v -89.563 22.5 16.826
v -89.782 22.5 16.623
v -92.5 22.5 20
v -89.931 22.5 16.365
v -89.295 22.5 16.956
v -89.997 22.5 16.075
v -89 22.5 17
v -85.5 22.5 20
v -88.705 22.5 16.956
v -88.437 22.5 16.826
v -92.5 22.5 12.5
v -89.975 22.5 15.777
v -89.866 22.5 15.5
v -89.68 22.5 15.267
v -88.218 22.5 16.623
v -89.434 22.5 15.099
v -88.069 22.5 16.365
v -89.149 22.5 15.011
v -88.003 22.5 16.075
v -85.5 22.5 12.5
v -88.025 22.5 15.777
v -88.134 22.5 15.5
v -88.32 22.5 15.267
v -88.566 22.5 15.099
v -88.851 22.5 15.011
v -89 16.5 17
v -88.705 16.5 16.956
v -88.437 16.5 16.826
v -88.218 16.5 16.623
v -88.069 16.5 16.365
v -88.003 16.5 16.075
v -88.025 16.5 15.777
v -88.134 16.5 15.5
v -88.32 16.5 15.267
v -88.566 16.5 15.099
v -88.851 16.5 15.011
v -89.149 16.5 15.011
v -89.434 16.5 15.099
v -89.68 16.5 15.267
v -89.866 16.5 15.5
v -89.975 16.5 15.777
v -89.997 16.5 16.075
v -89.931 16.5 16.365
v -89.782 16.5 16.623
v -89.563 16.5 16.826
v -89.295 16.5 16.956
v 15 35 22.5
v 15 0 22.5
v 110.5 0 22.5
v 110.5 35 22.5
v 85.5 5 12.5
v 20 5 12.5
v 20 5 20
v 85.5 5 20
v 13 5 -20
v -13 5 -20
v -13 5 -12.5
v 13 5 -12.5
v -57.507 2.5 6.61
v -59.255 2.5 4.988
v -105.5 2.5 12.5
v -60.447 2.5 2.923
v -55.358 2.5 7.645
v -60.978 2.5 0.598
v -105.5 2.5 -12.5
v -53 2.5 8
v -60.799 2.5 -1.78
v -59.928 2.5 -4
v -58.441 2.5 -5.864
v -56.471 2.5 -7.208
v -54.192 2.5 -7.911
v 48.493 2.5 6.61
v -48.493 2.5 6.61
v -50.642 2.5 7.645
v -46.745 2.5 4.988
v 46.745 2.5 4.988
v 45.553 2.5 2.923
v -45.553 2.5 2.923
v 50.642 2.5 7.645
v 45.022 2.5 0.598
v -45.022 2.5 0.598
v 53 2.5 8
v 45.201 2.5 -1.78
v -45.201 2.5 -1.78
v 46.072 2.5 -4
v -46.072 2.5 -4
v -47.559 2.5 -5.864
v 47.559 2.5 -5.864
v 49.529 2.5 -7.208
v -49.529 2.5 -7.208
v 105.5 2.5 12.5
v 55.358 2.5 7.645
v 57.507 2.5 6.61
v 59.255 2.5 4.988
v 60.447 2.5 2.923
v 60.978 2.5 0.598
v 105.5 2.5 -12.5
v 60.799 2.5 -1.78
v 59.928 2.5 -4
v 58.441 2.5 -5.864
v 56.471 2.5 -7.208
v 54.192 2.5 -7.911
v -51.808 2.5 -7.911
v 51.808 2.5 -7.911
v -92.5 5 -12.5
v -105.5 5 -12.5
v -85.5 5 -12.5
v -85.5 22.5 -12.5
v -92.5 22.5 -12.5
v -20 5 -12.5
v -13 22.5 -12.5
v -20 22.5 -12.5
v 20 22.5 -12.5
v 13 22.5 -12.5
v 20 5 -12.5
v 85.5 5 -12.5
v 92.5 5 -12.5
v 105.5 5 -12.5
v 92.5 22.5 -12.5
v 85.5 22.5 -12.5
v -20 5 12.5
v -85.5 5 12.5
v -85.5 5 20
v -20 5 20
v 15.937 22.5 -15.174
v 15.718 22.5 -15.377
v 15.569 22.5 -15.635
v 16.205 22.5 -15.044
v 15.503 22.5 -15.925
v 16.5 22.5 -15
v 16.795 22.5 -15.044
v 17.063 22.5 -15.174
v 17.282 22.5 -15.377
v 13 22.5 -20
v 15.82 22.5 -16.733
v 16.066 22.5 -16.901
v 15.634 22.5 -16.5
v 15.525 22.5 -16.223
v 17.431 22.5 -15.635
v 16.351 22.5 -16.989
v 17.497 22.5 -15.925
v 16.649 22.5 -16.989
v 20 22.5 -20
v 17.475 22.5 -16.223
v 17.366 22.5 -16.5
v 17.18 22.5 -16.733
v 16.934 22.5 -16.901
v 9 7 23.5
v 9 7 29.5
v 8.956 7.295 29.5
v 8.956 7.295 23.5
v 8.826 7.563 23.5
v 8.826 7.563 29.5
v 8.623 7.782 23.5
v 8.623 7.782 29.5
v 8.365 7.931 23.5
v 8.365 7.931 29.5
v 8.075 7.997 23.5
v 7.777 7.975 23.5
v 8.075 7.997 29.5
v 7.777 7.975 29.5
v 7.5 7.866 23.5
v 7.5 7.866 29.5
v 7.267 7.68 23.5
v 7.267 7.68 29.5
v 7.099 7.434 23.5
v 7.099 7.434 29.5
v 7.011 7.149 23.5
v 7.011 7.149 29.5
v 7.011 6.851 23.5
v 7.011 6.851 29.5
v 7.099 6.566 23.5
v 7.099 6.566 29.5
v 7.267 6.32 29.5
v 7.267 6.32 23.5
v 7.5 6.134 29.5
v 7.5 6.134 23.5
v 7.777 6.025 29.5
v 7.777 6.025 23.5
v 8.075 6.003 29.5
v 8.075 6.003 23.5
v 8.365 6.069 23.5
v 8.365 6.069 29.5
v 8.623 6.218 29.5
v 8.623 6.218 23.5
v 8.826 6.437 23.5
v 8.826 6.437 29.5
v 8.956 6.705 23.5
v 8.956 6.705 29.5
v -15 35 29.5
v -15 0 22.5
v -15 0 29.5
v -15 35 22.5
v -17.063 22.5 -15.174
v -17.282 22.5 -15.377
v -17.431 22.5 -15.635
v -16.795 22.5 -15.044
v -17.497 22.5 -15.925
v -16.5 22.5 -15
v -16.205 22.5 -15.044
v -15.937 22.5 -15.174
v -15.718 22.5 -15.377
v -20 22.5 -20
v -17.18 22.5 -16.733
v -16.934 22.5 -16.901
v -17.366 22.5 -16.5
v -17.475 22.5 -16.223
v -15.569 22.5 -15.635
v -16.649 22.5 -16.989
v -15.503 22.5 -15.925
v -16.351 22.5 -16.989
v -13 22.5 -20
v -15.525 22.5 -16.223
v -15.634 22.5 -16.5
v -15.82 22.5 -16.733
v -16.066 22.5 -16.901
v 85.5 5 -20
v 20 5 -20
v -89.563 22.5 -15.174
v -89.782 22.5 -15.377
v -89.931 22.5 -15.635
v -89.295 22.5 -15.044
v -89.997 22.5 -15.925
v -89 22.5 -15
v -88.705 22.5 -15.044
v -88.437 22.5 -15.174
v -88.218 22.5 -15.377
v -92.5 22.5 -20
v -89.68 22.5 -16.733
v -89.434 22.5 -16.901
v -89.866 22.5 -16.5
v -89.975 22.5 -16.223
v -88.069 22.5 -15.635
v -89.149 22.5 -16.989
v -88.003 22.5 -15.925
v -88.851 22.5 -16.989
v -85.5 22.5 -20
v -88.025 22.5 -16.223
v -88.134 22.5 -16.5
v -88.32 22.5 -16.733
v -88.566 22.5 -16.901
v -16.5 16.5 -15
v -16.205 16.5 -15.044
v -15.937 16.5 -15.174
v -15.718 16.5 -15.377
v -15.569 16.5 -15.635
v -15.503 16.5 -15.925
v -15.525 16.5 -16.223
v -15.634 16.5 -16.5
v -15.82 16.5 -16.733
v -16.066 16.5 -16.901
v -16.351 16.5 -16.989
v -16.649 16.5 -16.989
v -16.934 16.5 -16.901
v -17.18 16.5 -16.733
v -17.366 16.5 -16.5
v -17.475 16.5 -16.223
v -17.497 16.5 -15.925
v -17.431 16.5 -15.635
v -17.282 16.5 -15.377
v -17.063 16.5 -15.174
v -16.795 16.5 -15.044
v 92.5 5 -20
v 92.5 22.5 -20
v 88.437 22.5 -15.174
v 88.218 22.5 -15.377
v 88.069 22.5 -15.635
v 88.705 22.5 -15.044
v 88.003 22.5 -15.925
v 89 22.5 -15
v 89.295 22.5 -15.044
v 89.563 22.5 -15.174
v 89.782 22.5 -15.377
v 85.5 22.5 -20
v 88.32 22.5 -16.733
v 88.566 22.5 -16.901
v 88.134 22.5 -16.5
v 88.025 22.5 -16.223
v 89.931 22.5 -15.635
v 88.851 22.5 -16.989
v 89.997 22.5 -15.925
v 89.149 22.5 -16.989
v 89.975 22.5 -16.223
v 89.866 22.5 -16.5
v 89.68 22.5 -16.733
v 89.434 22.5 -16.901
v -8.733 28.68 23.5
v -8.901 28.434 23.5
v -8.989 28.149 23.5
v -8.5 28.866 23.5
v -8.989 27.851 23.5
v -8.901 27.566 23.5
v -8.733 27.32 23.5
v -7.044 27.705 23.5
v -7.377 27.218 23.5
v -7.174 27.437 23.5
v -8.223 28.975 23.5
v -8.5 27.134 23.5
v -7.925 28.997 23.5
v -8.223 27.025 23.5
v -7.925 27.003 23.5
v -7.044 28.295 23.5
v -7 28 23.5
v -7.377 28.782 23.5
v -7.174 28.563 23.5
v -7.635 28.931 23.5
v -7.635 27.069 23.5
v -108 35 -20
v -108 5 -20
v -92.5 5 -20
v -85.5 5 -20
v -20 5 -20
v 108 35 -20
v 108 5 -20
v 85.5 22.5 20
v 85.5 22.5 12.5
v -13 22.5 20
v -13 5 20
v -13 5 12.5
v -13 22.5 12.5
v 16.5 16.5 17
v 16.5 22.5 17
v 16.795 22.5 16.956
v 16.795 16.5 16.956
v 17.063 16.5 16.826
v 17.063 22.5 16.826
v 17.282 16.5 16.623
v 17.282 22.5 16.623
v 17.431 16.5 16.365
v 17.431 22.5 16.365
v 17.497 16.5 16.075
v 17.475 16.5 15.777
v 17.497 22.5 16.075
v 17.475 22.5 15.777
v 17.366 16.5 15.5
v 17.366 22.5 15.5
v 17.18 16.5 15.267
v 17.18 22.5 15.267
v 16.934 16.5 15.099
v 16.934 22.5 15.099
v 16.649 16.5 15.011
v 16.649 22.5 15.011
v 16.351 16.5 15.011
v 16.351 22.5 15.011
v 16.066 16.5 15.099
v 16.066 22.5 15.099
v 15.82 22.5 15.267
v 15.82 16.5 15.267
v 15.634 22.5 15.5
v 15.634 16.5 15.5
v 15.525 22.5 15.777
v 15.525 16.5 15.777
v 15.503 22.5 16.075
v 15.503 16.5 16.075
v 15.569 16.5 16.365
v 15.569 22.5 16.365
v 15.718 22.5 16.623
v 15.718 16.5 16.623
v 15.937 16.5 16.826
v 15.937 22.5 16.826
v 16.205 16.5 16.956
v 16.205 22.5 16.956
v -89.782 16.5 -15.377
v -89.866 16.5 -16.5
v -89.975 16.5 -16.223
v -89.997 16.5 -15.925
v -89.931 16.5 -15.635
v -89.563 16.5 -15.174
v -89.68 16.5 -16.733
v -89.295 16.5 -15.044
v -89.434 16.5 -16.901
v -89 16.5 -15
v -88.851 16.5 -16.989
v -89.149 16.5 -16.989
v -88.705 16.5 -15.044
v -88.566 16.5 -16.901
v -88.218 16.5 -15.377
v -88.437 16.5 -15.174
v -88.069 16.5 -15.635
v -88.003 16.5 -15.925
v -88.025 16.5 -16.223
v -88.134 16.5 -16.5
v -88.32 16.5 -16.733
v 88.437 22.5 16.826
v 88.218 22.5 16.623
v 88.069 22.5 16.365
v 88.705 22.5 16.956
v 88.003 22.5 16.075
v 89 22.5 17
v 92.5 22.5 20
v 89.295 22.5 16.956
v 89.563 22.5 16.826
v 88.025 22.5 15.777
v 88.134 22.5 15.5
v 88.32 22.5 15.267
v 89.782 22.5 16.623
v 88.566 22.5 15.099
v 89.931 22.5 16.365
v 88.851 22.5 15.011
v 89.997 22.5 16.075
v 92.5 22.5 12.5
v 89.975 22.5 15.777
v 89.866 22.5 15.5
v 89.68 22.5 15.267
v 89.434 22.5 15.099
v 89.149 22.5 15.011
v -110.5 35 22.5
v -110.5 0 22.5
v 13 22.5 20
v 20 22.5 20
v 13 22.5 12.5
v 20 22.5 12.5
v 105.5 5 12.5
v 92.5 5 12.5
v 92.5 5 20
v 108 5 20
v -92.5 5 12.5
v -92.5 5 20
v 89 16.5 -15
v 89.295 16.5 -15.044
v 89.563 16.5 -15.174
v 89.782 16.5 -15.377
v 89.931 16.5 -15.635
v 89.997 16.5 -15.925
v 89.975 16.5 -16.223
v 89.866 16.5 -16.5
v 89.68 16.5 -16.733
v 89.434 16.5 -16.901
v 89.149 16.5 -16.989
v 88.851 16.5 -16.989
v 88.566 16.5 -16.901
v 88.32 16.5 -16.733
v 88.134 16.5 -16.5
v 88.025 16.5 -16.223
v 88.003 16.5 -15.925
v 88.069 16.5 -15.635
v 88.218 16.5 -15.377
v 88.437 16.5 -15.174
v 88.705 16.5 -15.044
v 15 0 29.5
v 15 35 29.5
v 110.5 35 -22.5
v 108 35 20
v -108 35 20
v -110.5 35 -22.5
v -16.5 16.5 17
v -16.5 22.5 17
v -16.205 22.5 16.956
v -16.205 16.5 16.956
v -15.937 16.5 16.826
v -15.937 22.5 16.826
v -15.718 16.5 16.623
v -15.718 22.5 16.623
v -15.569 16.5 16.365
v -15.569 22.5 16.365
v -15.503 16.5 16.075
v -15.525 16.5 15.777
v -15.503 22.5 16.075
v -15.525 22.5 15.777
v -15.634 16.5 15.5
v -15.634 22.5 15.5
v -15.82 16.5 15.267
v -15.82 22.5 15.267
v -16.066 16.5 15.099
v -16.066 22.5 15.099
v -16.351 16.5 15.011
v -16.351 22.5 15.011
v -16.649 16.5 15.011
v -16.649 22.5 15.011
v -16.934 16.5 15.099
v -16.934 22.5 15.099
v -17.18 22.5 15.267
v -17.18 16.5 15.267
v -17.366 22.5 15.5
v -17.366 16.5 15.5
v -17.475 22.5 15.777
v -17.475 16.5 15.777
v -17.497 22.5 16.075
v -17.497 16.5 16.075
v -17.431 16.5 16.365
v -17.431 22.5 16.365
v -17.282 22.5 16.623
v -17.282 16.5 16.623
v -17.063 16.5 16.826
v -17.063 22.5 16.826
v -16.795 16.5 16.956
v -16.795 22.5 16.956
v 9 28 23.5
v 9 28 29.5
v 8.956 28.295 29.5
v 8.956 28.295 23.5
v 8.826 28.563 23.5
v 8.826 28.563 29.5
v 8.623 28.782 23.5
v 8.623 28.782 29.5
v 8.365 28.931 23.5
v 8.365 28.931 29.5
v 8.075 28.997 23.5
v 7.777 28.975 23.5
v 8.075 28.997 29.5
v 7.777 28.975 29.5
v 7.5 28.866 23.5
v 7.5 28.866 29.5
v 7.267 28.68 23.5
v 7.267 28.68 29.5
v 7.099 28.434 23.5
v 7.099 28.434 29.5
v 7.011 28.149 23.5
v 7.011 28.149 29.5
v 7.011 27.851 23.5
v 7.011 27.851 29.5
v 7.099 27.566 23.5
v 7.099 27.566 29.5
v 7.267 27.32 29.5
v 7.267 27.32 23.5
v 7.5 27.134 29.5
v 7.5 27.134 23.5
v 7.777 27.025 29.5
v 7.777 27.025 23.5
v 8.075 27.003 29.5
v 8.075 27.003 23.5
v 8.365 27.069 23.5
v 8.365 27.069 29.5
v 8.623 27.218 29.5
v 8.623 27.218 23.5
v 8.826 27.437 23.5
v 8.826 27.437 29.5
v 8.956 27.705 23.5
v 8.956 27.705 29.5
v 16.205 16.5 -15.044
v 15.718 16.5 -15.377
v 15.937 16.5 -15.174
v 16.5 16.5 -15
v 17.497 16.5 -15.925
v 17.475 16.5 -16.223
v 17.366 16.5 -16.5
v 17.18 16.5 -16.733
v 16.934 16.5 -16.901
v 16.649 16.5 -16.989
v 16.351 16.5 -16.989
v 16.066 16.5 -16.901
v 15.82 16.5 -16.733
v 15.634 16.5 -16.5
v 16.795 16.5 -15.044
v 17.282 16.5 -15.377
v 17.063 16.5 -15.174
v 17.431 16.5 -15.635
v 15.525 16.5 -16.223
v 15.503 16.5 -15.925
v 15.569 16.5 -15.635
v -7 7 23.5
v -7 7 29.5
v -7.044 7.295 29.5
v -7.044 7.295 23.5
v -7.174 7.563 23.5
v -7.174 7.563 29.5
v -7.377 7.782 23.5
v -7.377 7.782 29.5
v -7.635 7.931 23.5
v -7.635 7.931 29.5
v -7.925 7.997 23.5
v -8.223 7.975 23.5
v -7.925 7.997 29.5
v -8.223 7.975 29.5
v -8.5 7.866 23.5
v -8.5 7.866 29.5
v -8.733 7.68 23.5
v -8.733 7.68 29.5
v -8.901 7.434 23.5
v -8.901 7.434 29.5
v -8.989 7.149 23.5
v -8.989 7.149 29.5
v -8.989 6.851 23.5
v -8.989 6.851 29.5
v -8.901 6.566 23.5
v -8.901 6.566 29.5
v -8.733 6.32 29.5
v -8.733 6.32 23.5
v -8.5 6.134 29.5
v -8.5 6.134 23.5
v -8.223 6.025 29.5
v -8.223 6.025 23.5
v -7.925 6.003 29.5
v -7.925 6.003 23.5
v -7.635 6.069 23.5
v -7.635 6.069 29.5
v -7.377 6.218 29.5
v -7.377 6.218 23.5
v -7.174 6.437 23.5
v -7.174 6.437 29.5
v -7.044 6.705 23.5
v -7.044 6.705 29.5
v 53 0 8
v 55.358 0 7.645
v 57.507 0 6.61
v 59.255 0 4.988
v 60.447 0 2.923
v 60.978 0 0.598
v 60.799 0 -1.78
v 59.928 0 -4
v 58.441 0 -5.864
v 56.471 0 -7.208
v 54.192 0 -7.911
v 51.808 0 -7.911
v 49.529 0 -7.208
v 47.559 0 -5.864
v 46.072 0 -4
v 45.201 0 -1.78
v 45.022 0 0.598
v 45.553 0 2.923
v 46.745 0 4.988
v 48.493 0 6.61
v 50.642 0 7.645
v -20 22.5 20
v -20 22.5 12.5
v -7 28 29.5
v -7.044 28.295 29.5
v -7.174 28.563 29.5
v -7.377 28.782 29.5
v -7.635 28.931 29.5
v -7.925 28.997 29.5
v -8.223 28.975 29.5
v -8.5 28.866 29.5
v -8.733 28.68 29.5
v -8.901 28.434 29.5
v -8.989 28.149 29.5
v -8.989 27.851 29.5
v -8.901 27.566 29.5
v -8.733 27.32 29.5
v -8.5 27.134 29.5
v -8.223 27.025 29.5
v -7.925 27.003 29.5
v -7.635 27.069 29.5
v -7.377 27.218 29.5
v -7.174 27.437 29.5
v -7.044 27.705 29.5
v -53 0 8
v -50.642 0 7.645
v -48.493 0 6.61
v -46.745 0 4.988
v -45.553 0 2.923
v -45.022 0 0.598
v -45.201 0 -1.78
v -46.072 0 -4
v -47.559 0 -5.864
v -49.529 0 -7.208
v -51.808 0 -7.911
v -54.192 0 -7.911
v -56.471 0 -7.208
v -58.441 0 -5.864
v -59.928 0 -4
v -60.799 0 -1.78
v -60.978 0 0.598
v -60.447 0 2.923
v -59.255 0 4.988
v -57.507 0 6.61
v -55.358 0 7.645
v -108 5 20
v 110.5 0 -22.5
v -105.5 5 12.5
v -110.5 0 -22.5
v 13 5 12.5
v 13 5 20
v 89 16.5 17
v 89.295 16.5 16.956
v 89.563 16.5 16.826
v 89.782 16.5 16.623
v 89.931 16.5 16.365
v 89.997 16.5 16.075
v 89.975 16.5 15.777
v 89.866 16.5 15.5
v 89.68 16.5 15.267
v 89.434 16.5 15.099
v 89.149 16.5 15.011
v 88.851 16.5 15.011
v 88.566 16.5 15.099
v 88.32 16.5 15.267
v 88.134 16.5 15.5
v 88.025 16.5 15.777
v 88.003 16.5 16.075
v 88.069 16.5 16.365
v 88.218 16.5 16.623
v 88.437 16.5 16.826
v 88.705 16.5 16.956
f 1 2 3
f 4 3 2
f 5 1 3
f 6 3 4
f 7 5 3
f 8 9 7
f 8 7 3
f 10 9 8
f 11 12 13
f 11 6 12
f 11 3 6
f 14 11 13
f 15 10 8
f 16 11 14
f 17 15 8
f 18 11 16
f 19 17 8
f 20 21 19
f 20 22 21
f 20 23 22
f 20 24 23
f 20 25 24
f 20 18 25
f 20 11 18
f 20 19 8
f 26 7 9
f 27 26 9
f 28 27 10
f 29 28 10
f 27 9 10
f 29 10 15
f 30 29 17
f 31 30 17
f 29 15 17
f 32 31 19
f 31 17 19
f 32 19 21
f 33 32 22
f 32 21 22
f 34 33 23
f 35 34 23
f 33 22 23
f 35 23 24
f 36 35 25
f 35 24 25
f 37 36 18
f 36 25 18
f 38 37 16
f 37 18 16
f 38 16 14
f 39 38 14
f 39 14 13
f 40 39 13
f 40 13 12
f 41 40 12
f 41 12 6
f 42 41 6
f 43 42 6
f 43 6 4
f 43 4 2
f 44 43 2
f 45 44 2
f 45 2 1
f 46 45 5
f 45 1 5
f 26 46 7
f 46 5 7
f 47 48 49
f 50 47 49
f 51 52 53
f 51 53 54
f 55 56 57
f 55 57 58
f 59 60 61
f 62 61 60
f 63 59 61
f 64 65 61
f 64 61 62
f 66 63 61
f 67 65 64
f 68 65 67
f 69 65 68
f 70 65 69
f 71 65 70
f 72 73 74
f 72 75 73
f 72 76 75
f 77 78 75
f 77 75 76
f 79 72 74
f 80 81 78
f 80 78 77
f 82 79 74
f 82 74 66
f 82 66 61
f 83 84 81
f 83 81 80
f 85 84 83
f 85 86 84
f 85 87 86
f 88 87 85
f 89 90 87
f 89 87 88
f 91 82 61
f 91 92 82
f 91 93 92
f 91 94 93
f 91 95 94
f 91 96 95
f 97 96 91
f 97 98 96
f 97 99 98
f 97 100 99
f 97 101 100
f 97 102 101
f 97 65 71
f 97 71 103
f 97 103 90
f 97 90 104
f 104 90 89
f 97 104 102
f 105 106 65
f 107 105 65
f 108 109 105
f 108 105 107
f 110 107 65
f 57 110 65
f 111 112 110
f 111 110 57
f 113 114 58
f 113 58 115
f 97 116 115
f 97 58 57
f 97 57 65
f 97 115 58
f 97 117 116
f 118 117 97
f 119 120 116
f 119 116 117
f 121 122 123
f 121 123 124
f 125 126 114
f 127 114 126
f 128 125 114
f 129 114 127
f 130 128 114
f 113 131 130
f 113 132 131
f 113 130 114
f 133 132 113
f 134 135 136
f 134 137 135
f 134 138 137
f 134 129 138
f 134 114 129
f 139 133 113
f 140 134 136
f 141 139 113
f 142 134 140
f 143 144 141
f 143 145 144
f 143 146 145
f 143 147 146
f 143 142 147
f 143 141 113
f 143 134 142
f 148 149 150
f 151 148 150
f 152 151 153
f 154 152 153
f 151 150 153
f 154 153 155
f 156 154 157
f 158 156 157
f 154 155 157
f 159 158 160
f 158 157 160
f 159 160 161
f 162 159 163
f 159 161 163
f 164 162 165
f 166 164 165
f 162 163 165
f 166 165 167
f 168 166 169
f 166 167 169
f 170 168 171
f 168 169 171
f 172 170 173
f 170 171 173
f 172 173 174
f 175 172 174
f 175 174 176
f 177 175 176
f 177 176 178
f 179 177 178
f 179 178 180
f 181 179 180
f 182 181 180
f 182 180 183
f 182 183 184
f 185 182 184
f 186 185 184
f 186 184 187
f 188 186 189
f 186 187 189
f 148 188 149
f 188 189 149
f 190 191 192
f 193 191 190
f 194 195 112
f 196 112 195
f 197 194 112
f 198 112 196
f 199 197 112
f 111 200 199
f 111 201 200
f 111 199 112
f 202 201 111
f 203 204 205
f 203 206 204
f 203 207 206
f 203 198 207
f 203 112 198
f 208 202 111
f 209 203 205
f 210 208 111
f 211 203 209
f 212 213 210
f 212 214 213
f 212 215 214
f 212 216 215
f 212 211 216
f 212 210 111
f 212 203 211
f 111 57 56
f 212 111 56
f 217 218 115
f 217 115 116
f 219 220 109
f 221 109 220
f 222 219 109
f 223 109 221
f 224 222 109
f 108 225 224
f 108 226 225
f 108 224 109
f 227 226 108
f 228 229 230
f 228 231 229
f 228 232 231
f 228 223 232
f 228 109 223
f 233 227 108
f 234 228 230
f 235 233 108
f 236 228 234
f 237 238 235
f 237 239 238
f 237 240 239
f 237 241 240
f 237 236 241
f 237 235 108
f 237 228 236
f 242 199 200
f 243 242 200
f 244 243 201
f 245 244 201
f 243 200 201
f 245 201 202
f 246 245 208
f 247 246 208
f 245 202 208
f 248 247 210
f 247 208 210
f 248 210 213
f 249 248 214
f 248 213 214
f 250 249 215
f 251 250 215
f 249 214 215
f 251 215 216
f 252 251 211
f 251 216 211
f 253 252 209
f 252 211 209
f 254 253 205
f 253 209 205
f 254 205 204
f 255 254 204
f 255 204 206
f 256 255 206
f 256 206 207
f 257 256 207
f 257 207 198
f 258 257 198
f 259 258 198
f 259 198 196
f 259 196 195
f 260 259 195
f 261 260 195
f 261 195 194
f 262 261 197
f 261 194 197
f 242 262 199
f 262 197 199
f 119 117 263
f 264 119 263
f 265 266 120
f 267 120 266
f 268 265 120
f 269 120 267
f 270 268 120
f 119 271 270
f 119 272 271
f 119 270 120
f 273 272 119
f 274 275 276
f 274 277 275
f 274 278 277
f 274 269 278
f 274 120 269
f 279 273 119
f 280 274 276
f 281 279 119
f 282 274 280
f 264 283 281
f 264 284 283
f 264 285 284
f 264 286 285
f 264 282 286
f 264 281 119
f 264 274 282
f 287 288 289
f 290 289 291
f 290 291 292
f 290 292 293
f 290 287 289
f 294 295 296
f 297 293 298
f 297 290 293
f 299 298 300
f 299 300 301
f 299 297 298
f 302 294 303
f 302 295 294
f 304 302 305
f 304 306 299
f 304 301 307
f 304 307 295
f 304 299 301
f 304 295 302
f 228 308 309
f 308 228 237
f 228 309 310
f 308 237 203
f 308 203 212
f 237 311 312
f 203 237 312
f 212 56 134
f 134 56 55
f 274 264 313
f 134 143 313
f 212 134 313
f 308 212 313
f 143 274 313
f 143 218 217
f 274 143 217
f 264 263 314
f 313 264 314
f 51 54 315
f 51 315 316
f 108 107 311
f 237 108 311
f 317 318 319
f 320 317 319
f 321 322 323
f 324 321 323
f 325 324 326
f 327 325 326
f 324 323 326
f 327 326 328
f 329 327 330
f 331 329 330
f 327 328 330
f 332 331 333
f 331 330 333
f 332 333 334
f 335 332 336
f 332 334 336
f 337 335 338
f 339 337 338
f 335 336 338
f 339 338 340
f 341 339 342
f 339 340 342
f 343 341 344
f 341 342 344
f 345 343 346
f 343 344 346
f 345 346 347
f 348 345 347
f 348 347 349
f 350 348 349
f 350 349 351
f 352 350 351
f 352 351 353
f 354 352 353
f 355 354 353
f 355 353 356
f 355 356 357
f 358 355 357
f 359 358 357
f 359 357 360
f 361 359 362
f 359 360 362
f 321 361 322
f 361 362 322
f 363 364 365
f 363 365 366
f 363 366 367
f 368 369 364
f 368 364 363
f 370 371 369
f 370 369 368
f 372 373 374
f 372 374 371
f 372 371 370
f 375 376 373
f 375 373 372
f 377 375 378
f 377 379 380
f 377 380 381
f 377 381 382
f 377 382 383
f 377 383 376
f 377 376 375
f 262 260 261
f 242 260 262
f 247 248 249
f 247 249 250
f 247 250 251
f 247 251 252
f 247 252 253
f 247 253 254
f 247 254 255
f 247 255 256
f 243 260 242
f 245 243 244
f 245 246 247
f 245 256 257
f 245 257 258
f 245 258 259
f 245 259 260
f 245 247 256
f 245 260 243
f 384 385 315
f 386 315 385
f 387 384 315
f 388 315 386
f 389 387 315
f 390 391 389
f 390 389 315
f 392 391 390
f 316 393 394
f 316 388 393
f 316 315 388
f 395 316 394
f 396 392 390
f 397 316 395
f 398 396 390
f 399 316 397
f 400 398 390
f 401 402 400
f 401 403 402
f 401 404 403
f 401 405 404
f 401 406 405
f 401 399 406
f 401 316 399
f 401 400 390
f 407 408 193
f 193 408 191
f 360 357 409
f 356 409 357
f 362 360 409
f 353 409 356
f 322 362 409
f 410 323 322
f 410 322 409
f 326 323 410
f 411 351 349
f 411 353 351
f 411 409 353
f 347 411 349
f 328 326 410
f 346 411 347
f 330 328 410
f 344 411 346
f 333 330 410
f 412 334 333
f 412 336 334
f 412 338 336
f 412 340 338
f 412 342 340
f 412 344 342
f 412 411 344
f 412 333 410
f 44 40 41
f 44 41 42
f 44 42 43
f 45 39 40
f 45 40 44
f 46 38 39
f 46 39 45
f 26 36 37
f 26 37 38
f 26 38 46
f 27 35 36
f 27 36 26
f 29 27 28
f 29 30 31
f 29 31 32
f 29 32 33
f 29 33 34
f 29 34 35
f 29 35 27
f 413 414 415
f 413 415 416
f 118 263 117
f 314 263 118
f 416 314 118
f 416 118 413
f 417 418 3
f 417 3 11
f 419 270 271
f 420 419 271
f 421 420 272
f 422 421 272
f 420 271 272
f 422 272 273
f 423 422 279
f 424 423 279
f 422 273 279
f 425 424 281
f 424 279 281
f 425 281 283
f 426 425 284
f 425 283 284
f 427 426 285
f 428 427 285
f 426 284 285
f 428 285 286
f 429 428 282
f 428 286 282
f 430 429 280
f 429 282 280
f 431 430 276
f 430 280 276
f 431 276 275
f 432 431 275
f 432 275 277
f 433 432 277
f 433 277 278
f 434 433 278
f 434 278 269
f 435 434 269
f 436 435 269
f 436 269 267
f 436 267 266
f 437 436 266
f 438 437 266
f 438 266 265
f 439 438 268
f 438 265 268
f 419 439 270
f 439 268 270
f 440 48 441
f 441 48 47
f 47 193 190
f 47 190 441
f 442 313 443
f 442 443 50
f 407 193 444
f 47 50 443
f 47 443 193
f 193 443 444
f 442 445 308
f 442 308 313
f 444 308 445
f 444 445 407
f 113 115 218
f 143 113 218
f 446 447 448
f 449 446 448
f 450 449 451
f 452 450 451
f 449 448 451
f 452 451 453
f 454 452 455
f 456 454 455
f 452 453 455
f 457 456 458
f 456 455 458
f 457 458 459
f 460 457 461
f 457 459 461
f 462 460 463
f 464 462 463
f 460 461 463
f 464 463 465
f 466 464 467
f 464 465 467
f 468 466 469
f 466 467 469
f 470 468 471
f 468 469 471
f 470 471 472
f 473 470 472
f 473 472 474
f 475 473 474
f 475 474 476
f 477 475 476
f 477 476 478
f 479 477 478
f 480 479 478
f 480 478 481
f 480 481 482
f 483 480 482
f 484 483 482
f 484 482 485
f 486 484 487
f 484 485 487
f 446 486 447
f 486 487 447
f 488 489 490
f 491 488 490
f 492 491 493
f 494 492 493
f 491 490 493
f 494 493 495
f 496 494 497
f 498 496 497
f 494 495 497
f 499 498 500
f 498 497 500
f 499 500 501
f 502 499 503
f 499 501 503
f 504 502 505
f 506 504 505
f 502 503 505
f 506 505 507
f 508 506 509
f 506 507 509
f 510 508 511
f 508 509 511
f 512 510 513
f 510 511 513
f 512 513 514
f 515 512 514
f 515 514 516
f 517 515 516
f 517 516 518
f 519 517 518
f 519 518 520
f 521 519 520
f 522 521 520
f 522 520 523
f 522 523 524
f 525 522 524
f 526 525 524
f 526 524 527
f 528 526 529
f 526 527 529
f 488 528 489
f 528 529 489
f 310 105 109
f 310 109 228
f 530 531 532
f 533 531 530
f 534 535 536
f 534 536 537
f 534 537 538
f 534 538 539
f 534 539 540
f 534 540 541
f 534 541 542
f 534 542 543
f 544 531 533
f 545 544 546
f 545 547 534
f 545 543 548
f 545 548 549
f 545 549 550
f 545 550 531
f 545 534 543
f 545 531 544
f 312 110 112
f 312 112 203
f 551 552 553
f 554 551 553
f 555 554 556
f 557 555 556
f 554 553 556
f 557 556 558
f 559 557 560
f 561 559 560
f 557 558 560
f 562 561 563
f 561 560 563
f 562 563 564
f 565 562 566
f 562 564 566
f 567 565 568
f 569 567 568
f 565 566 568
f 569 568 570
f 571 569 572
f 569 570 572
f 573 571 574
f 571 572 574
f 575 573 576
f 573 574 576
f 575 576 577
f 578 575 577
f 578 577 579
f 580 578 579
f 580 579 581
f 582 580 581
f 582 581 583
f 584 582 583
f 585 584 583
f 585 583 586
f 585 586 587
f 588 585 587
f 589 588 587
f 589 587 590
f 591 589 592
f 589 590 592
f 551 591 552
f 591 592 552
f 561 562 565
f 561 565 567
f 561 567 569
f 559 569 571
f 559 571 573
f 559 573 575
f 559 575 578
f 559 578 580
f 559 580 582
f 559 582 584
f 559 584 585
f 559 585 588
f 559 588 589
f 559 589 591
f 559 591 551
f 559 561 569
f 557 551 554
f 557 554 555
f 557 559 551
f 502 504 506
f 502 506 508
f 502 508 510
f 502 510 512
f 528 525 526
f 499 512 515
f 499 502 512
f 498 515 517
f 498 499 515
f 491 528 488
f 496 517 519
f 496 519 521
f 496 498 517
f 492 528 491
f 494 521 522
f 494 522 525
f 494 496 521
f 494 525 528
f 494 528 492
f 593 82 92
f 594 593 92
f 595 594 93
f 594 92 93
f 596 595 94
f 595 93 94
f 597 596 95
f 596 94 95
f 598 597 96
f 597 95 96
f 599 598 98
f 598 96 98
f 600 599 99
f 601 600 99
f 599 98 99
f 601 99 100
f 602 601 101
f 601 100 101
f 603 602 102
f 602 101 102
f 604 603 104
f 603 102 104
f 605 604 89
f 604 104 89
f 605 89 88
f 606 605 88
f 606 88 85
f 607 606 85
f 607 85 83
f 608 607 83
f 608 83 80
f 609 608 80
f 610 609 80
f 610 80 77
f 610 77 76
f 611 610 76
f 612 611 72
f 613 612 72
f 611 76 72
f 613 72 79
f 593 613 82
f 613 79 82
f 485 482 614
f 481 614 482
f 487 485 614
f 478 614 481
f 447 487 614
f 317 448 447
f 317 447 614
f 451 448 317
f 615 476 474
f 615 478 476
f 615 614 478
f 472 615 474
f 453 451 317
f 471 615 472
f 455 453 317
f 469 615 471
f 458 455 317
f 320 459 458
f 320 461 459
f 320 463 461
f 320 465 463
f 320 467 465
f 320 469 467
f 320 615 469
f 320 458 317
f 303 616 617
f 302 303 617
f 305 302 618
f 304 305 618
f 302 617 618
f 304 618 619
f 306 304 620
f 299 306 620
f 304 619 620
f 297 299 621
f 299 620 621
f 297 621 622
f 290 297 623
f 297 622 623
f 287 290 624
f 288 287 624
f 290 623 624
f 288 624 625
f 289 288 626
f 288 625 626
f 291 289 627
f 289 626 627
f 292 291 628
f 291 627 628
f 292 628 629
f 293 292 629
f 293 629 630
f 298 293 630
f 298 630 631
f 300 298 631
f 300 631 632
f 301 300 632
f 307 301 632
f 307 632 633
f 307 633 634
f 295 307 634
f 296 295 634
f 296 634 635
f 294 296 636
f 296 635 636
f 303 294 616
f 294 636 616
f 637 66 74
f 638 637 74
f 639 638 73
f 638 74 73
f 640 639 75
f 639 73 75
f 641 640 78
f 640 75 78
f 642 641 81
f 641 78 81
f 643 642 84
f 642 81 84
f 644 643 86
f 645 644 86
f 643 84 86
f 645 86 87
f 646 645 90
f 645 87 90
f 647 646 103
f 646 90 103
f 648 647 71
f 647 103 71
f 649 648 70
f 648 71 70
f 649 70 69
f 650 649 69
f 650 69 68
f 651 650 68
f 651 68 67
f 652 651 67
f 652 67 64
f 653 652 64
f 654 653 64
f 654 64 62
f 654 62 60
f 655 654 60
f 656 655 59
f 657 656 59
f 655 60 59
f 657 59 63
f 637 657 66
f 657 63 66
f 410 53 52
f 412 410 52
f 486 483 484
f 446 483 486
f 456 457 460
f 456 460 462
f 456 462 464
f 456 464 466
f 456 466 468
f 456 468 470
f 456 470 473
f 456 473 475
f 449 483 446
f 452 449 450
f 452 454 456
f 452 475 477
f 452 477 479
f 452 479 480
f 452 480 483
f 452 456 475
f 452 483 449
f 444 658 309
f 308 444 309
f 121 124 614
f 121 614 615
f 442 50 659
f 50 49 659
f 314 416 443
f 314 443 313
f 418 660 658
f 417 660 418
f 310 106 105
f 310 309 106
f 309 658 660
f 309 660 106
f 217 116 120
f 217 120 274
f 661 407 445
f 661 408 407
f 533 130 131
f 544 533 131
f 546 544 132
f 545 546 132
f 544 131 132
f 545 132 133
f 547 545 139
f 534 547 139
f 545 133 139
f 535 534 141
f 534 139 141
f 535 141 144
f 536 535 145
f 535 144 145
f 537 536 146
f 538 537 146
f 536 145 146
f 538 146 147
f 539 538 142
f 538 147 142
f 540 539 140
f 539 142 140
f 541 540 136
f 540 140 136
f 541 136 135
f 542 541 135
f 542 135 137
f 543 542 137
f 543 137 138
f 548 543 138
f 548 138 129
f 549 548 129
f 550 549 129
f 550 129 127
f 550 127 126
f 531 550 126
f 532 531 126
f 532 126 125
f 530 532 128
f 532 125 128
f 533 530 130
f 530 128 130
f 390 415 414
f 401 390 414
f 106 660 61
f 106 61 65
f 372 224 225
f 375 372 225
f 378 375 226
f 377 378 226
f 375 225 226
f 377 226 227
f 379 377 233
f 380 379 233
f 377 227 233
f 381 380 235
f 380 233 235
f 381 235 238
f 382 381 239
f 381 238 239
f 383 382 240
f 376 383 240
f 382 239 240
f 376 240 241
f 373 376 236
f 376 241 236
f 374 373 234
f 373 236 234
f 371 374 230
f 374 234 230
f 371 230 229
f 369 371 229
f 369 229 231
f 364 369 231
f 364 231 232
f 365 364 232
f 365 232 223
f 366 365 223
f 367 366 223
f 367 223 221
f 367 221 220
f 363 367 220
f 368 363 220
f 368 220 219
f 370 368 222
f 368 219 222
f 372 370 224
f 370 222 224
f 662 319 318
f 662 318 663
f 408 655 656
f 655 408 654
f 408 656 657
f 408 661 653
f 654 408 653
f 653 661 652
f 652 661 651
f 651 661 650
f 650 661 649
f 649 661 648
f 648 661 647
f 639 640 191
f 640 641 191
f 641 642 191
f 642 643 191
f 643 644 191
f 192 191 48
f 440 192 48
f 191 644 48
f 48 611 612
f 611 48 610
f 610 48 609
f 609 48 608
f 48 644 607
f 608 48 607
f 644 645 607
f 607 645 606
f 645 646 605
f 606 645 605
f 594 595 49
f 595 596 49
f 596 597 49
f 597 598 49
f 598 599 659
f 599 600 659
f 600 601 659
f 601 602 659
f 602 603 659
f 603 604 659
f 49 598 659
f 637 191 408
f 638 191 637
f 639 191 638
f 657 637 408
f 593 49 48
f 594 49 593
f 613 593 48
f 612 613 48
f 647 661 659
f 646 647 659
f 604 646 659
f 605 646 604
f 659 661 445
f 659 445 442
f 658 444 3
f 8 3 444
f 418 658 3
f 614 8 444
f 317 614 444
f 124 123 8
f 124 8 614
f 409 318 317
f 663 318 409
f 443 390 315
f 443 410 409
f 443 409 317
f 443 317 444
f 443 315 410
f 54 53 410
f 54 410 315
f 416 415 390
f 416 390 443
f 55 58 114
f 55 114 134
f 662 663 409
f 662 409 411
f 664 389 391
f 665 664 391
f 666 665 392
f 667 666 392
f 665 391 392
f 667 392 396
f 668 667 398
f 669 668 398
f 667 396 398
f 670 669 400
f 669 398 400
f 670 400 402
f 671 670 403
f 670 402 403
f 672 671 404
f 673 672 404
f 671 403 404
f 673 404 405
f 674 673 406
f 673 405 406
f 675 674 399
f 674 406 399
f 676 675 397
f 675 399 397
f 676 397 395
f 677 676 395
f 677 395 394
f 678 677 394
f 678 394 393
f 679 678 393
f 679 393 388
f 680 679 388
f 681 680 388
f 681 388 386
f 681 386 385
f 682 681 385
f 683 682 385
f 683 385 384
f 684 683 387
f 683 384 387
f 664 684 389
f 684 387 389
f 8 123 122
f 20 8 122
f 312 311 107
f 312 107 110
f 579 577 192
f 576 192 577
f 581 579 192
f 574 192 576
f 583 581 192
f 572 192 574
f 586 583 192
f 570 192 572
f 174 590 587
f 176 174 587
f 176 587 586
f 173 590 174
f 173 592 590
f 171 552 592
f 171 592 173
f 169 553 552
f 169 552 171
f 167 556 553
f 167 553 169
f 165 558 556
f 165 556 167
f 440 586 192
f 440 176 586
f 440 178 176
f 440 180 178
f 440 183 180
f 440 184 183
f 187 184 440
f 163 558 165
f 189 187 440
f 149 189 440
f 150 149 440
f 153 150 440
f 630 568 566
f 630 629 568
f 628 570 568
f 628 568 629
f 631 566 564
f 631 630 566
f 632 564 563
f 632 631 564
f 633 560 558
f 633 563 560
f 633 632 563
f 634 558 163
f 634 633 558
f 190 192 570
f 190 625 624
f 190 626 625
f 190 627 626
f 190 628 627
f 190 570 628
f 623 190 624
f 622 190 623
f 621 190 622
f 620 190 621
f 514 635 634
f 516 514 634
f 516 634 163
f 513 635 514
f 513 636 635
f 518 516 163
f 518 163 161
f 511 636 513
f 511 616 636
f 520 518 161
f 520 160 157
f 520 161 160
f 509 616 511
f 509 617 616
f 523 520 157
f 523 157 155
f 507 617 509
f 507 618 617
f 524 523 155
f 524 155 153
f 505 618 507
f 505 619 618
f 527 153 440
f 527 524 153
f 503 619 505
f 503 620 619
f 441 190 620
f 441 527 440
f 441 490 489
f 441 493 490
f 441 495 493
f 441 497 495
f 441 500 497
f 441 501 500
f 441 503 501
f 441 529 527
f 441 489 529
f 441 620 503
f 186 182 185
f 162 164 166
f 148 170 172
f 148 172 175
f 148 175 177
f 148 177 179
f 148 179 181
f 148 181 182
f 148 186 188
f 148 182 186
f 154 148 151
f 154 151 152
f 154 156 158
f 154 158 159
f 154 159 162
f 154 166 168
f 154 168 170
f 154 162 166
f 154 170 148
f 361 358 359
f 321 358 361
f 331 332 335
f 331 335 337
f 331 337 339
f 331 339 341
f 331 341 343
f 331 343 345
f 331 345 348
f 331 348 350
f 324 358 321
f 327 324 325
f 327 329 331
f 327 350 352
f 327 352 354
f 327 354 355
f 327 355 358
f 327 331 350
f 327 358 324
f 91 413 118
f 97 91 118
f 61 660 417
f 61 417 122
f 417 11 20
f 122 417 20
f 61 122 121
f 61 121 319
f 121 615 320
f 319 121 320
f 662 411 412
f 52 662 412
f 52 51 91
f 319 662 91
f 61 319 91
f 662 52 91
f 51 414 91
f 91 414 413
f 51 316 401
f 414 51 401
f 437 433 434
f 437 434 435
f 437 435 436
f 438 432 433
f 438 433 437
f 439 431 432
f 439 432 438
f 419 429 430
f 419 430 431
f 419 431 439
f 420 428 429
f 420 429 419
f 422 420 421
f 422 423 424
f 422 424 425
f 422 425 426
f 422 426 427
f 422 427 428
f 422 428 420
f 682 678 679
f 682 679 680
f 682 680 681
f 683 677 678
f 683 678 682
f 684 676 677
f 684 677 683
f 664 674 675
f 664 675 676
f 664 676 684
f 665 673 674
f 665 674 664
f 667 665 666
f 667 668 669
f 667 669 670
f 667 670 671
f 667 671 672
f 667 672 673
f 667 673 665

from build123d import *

# Parameters (mm, degrees)
SKETCH1_W           = 221
SKETCH1_H           = 45
BOSS_EXTRUDE1_DEPTH = 5
SKETCH2_W           = 211
SKETCH2_H           = 25
CUT_EXTRUDE1_DEPTH  = 2.5
SKETCH3_R           = 8
CUT_EXTRUDE2_DEPTH  = 2.5
SKETCH6_W           = 221
SKETCH6_H           = 45
SKETCH6_W_2         = 216
SKETCH6_H_2         = 40
BOSS_EXTRUDE3_DEPTH = 30
SKETCH7_W           = 7
SKETCH7_H           = 7.5
BOSS_EXTRUDE4_DEPTH = 17.5
SKETCH9_R           = 1
CUT_EXTRUDE3_DEPTH  = 6
SKETCH10_W          = 30
SKETCH10_H          = 35
BOSS_EXTRUDE5_DEPTH = 7
SKETCH11_R          = 1
CUT_EXTRUDE4_DEPTH  = 6


with BuildPart() as part:
    # Sketch1 → Boss-Extrude1 (new body)
    with BuildSketch(Plane(origin=(0, 0, 0), x_dir=(1, 0, 0), z_dir=(0, 1, 0))):
        Rectangle(SKETCH1_W, SKETCH1_H)
    extrude(amount=BOSS_EXTRUDE1_DEPTH)

    # Sketch2 → Cut-Extrude1 (cut)
    with BuildSketch(Plane(origin=(0, 5, 0), x_dir=(1, 0, 0), z_dir=(0, 1, 0))):
        Rectangle(SKETCH2_W, SKETCH2_H)
    extrude(amount=-CUT_EXTRUDE1_DEPTH, mode=Mode.SUBTRACT)

    # Sketch3 → Cut-Extrude2 (cut)
    with BuildSketch(Plane(origin=(0, 2.5, 0), x_dir=(1, 0, 0), z_dir=(0, 1, 0))):
        with Locations(Location((-53, 0, 0), (0, 0, 270))):
            Circle(SKETCH3_R)
        with Locations(Location((53, 0, 0), (0, 0, 270))):
            Circle(SKETCH3_R)
    extrude(amount=-CUT_EXTRUDE2_DEPTH, mode=Mode.SUBTRACT)

    # Sketch6 → Boss-Extrude3 (add)
    with BuildSketch(Plane(origin=(0, 5, 0), x_dir=(1, 0, 0), z_dir=(0, 1, 0))):
        Rectangle(SKETCH6_W, SKETCH6_H)
        Rectangle(SKETCH6_W_2, SKETCH6_H_2, mode=Mode.SUBTRACT)
    extrude(amount=BOSS_EXTRUDE3_DEPTH)

    # Sketch7 → Boss-Extrude4 (add)
    with BuildSketch(Plane(origin=(0, 5, 0), x_dir=(1, 0, 0), z_dir=(0, 1, 0))):
        with Locations((-89, 16.25)):
            Rectangle(SKETCH7_W, SKETCH7_H)
        with Locations((-89, -16.25)):
            Rectangle(SKETCH7_W, SKETCH7_H)
        with Locations((-16.5, 16.25)):
            Rectangle(SKETCH7_W, SKETCH7_H)
        with Locations((-16.5, -16.25)):
            Rectangle(SKETCH7_W, SKETCH7_H)
        with Locations((16.5, 16.25)):
            Rectangle(SKETCH7_W, SKETCH7_H)
        with Locations((16.5, -16.25)):
            Rectangle(SKETCH7_W, SKETCH7_H)
        with Locations((89, 16.25)):
            Rectangle(SKETCH7_W, SKETCH7_H)
        with Locations((89, -16.25)):
            Rectangle(SKETCH7_W, SKETCH7_H)
    extrude(amount=BOSS_EXTRUDE4_DEPTH)

    # Sketch9 → Cut-Extrude3 (cut)
    with BuildSketch(Plane(origin=(0, 22.5, 0), x_dir=(1, 0, 0), z_dir=(0, 1, 0))):
        with Locations(Location((-89, 16, 0), (0, 0, 270))):
            Circle(SKETCH9_R)
        with Locations(Location((-89, -16, 0), (0, 0, 270))):
            Circle(SKETCH9_R)
        with Locations(Location((-16.5, 16, 0), (0, 0, 270))):
            Circle(SKETCH9_R)
        with Locations(Location((-16.5, -16, 0), (0, 0, 270))):
            Circle(SKETCH9_R)
        with Locations(Location((16.5, 16, 0), (0, 0, 270))):
            Circle(SKETCH9_R)
        with Locations(Location((16.5, -16, 0), (0, 0, 270))):
            Circle(SKETCH9_R)
        with Locations(Location((89, 16, 0), (0, 0, 270))):
            Circle(SKETCH9_R)
        with Locations(Location((89, -16, 0), (0, 0, 270))):
            Circle(SKETCH9_R)
    extrude(amount=-CUT_EXTRUDE3_DEPTH, mode=Mode.SUBTRACT)

    # Sketch10 → Boss-Extrude5 (add)
    with BuildSketch(Plane.XY.offset(22.5)):
        with Locations((0, 17.5)):
            Rectangle(SKETCH10_W, SKETCH10_H)
    extrude(amount=BOSS_EXTRUDE5_DEPTH)

    # Sketch11 → Cut-Extrude4 (cut)
    with BuildSketch(Plane.XY.offset(29.5)):
        with Locations((-8, 28)):
            Circle(SKETCH11_R)
        with Locations((8, 28)):
            Circle(SKETCH11_R)
        with Locations((-8, 7)):
            Circle(SKETCH11_R)
        with Locations((8, 7)):
            Circle(SKETCH11_R)
    extrude(amount=-CUT_EXTRUDE4_DEPTH, mode=Mode.SUBTRACT)


solid = part.part
